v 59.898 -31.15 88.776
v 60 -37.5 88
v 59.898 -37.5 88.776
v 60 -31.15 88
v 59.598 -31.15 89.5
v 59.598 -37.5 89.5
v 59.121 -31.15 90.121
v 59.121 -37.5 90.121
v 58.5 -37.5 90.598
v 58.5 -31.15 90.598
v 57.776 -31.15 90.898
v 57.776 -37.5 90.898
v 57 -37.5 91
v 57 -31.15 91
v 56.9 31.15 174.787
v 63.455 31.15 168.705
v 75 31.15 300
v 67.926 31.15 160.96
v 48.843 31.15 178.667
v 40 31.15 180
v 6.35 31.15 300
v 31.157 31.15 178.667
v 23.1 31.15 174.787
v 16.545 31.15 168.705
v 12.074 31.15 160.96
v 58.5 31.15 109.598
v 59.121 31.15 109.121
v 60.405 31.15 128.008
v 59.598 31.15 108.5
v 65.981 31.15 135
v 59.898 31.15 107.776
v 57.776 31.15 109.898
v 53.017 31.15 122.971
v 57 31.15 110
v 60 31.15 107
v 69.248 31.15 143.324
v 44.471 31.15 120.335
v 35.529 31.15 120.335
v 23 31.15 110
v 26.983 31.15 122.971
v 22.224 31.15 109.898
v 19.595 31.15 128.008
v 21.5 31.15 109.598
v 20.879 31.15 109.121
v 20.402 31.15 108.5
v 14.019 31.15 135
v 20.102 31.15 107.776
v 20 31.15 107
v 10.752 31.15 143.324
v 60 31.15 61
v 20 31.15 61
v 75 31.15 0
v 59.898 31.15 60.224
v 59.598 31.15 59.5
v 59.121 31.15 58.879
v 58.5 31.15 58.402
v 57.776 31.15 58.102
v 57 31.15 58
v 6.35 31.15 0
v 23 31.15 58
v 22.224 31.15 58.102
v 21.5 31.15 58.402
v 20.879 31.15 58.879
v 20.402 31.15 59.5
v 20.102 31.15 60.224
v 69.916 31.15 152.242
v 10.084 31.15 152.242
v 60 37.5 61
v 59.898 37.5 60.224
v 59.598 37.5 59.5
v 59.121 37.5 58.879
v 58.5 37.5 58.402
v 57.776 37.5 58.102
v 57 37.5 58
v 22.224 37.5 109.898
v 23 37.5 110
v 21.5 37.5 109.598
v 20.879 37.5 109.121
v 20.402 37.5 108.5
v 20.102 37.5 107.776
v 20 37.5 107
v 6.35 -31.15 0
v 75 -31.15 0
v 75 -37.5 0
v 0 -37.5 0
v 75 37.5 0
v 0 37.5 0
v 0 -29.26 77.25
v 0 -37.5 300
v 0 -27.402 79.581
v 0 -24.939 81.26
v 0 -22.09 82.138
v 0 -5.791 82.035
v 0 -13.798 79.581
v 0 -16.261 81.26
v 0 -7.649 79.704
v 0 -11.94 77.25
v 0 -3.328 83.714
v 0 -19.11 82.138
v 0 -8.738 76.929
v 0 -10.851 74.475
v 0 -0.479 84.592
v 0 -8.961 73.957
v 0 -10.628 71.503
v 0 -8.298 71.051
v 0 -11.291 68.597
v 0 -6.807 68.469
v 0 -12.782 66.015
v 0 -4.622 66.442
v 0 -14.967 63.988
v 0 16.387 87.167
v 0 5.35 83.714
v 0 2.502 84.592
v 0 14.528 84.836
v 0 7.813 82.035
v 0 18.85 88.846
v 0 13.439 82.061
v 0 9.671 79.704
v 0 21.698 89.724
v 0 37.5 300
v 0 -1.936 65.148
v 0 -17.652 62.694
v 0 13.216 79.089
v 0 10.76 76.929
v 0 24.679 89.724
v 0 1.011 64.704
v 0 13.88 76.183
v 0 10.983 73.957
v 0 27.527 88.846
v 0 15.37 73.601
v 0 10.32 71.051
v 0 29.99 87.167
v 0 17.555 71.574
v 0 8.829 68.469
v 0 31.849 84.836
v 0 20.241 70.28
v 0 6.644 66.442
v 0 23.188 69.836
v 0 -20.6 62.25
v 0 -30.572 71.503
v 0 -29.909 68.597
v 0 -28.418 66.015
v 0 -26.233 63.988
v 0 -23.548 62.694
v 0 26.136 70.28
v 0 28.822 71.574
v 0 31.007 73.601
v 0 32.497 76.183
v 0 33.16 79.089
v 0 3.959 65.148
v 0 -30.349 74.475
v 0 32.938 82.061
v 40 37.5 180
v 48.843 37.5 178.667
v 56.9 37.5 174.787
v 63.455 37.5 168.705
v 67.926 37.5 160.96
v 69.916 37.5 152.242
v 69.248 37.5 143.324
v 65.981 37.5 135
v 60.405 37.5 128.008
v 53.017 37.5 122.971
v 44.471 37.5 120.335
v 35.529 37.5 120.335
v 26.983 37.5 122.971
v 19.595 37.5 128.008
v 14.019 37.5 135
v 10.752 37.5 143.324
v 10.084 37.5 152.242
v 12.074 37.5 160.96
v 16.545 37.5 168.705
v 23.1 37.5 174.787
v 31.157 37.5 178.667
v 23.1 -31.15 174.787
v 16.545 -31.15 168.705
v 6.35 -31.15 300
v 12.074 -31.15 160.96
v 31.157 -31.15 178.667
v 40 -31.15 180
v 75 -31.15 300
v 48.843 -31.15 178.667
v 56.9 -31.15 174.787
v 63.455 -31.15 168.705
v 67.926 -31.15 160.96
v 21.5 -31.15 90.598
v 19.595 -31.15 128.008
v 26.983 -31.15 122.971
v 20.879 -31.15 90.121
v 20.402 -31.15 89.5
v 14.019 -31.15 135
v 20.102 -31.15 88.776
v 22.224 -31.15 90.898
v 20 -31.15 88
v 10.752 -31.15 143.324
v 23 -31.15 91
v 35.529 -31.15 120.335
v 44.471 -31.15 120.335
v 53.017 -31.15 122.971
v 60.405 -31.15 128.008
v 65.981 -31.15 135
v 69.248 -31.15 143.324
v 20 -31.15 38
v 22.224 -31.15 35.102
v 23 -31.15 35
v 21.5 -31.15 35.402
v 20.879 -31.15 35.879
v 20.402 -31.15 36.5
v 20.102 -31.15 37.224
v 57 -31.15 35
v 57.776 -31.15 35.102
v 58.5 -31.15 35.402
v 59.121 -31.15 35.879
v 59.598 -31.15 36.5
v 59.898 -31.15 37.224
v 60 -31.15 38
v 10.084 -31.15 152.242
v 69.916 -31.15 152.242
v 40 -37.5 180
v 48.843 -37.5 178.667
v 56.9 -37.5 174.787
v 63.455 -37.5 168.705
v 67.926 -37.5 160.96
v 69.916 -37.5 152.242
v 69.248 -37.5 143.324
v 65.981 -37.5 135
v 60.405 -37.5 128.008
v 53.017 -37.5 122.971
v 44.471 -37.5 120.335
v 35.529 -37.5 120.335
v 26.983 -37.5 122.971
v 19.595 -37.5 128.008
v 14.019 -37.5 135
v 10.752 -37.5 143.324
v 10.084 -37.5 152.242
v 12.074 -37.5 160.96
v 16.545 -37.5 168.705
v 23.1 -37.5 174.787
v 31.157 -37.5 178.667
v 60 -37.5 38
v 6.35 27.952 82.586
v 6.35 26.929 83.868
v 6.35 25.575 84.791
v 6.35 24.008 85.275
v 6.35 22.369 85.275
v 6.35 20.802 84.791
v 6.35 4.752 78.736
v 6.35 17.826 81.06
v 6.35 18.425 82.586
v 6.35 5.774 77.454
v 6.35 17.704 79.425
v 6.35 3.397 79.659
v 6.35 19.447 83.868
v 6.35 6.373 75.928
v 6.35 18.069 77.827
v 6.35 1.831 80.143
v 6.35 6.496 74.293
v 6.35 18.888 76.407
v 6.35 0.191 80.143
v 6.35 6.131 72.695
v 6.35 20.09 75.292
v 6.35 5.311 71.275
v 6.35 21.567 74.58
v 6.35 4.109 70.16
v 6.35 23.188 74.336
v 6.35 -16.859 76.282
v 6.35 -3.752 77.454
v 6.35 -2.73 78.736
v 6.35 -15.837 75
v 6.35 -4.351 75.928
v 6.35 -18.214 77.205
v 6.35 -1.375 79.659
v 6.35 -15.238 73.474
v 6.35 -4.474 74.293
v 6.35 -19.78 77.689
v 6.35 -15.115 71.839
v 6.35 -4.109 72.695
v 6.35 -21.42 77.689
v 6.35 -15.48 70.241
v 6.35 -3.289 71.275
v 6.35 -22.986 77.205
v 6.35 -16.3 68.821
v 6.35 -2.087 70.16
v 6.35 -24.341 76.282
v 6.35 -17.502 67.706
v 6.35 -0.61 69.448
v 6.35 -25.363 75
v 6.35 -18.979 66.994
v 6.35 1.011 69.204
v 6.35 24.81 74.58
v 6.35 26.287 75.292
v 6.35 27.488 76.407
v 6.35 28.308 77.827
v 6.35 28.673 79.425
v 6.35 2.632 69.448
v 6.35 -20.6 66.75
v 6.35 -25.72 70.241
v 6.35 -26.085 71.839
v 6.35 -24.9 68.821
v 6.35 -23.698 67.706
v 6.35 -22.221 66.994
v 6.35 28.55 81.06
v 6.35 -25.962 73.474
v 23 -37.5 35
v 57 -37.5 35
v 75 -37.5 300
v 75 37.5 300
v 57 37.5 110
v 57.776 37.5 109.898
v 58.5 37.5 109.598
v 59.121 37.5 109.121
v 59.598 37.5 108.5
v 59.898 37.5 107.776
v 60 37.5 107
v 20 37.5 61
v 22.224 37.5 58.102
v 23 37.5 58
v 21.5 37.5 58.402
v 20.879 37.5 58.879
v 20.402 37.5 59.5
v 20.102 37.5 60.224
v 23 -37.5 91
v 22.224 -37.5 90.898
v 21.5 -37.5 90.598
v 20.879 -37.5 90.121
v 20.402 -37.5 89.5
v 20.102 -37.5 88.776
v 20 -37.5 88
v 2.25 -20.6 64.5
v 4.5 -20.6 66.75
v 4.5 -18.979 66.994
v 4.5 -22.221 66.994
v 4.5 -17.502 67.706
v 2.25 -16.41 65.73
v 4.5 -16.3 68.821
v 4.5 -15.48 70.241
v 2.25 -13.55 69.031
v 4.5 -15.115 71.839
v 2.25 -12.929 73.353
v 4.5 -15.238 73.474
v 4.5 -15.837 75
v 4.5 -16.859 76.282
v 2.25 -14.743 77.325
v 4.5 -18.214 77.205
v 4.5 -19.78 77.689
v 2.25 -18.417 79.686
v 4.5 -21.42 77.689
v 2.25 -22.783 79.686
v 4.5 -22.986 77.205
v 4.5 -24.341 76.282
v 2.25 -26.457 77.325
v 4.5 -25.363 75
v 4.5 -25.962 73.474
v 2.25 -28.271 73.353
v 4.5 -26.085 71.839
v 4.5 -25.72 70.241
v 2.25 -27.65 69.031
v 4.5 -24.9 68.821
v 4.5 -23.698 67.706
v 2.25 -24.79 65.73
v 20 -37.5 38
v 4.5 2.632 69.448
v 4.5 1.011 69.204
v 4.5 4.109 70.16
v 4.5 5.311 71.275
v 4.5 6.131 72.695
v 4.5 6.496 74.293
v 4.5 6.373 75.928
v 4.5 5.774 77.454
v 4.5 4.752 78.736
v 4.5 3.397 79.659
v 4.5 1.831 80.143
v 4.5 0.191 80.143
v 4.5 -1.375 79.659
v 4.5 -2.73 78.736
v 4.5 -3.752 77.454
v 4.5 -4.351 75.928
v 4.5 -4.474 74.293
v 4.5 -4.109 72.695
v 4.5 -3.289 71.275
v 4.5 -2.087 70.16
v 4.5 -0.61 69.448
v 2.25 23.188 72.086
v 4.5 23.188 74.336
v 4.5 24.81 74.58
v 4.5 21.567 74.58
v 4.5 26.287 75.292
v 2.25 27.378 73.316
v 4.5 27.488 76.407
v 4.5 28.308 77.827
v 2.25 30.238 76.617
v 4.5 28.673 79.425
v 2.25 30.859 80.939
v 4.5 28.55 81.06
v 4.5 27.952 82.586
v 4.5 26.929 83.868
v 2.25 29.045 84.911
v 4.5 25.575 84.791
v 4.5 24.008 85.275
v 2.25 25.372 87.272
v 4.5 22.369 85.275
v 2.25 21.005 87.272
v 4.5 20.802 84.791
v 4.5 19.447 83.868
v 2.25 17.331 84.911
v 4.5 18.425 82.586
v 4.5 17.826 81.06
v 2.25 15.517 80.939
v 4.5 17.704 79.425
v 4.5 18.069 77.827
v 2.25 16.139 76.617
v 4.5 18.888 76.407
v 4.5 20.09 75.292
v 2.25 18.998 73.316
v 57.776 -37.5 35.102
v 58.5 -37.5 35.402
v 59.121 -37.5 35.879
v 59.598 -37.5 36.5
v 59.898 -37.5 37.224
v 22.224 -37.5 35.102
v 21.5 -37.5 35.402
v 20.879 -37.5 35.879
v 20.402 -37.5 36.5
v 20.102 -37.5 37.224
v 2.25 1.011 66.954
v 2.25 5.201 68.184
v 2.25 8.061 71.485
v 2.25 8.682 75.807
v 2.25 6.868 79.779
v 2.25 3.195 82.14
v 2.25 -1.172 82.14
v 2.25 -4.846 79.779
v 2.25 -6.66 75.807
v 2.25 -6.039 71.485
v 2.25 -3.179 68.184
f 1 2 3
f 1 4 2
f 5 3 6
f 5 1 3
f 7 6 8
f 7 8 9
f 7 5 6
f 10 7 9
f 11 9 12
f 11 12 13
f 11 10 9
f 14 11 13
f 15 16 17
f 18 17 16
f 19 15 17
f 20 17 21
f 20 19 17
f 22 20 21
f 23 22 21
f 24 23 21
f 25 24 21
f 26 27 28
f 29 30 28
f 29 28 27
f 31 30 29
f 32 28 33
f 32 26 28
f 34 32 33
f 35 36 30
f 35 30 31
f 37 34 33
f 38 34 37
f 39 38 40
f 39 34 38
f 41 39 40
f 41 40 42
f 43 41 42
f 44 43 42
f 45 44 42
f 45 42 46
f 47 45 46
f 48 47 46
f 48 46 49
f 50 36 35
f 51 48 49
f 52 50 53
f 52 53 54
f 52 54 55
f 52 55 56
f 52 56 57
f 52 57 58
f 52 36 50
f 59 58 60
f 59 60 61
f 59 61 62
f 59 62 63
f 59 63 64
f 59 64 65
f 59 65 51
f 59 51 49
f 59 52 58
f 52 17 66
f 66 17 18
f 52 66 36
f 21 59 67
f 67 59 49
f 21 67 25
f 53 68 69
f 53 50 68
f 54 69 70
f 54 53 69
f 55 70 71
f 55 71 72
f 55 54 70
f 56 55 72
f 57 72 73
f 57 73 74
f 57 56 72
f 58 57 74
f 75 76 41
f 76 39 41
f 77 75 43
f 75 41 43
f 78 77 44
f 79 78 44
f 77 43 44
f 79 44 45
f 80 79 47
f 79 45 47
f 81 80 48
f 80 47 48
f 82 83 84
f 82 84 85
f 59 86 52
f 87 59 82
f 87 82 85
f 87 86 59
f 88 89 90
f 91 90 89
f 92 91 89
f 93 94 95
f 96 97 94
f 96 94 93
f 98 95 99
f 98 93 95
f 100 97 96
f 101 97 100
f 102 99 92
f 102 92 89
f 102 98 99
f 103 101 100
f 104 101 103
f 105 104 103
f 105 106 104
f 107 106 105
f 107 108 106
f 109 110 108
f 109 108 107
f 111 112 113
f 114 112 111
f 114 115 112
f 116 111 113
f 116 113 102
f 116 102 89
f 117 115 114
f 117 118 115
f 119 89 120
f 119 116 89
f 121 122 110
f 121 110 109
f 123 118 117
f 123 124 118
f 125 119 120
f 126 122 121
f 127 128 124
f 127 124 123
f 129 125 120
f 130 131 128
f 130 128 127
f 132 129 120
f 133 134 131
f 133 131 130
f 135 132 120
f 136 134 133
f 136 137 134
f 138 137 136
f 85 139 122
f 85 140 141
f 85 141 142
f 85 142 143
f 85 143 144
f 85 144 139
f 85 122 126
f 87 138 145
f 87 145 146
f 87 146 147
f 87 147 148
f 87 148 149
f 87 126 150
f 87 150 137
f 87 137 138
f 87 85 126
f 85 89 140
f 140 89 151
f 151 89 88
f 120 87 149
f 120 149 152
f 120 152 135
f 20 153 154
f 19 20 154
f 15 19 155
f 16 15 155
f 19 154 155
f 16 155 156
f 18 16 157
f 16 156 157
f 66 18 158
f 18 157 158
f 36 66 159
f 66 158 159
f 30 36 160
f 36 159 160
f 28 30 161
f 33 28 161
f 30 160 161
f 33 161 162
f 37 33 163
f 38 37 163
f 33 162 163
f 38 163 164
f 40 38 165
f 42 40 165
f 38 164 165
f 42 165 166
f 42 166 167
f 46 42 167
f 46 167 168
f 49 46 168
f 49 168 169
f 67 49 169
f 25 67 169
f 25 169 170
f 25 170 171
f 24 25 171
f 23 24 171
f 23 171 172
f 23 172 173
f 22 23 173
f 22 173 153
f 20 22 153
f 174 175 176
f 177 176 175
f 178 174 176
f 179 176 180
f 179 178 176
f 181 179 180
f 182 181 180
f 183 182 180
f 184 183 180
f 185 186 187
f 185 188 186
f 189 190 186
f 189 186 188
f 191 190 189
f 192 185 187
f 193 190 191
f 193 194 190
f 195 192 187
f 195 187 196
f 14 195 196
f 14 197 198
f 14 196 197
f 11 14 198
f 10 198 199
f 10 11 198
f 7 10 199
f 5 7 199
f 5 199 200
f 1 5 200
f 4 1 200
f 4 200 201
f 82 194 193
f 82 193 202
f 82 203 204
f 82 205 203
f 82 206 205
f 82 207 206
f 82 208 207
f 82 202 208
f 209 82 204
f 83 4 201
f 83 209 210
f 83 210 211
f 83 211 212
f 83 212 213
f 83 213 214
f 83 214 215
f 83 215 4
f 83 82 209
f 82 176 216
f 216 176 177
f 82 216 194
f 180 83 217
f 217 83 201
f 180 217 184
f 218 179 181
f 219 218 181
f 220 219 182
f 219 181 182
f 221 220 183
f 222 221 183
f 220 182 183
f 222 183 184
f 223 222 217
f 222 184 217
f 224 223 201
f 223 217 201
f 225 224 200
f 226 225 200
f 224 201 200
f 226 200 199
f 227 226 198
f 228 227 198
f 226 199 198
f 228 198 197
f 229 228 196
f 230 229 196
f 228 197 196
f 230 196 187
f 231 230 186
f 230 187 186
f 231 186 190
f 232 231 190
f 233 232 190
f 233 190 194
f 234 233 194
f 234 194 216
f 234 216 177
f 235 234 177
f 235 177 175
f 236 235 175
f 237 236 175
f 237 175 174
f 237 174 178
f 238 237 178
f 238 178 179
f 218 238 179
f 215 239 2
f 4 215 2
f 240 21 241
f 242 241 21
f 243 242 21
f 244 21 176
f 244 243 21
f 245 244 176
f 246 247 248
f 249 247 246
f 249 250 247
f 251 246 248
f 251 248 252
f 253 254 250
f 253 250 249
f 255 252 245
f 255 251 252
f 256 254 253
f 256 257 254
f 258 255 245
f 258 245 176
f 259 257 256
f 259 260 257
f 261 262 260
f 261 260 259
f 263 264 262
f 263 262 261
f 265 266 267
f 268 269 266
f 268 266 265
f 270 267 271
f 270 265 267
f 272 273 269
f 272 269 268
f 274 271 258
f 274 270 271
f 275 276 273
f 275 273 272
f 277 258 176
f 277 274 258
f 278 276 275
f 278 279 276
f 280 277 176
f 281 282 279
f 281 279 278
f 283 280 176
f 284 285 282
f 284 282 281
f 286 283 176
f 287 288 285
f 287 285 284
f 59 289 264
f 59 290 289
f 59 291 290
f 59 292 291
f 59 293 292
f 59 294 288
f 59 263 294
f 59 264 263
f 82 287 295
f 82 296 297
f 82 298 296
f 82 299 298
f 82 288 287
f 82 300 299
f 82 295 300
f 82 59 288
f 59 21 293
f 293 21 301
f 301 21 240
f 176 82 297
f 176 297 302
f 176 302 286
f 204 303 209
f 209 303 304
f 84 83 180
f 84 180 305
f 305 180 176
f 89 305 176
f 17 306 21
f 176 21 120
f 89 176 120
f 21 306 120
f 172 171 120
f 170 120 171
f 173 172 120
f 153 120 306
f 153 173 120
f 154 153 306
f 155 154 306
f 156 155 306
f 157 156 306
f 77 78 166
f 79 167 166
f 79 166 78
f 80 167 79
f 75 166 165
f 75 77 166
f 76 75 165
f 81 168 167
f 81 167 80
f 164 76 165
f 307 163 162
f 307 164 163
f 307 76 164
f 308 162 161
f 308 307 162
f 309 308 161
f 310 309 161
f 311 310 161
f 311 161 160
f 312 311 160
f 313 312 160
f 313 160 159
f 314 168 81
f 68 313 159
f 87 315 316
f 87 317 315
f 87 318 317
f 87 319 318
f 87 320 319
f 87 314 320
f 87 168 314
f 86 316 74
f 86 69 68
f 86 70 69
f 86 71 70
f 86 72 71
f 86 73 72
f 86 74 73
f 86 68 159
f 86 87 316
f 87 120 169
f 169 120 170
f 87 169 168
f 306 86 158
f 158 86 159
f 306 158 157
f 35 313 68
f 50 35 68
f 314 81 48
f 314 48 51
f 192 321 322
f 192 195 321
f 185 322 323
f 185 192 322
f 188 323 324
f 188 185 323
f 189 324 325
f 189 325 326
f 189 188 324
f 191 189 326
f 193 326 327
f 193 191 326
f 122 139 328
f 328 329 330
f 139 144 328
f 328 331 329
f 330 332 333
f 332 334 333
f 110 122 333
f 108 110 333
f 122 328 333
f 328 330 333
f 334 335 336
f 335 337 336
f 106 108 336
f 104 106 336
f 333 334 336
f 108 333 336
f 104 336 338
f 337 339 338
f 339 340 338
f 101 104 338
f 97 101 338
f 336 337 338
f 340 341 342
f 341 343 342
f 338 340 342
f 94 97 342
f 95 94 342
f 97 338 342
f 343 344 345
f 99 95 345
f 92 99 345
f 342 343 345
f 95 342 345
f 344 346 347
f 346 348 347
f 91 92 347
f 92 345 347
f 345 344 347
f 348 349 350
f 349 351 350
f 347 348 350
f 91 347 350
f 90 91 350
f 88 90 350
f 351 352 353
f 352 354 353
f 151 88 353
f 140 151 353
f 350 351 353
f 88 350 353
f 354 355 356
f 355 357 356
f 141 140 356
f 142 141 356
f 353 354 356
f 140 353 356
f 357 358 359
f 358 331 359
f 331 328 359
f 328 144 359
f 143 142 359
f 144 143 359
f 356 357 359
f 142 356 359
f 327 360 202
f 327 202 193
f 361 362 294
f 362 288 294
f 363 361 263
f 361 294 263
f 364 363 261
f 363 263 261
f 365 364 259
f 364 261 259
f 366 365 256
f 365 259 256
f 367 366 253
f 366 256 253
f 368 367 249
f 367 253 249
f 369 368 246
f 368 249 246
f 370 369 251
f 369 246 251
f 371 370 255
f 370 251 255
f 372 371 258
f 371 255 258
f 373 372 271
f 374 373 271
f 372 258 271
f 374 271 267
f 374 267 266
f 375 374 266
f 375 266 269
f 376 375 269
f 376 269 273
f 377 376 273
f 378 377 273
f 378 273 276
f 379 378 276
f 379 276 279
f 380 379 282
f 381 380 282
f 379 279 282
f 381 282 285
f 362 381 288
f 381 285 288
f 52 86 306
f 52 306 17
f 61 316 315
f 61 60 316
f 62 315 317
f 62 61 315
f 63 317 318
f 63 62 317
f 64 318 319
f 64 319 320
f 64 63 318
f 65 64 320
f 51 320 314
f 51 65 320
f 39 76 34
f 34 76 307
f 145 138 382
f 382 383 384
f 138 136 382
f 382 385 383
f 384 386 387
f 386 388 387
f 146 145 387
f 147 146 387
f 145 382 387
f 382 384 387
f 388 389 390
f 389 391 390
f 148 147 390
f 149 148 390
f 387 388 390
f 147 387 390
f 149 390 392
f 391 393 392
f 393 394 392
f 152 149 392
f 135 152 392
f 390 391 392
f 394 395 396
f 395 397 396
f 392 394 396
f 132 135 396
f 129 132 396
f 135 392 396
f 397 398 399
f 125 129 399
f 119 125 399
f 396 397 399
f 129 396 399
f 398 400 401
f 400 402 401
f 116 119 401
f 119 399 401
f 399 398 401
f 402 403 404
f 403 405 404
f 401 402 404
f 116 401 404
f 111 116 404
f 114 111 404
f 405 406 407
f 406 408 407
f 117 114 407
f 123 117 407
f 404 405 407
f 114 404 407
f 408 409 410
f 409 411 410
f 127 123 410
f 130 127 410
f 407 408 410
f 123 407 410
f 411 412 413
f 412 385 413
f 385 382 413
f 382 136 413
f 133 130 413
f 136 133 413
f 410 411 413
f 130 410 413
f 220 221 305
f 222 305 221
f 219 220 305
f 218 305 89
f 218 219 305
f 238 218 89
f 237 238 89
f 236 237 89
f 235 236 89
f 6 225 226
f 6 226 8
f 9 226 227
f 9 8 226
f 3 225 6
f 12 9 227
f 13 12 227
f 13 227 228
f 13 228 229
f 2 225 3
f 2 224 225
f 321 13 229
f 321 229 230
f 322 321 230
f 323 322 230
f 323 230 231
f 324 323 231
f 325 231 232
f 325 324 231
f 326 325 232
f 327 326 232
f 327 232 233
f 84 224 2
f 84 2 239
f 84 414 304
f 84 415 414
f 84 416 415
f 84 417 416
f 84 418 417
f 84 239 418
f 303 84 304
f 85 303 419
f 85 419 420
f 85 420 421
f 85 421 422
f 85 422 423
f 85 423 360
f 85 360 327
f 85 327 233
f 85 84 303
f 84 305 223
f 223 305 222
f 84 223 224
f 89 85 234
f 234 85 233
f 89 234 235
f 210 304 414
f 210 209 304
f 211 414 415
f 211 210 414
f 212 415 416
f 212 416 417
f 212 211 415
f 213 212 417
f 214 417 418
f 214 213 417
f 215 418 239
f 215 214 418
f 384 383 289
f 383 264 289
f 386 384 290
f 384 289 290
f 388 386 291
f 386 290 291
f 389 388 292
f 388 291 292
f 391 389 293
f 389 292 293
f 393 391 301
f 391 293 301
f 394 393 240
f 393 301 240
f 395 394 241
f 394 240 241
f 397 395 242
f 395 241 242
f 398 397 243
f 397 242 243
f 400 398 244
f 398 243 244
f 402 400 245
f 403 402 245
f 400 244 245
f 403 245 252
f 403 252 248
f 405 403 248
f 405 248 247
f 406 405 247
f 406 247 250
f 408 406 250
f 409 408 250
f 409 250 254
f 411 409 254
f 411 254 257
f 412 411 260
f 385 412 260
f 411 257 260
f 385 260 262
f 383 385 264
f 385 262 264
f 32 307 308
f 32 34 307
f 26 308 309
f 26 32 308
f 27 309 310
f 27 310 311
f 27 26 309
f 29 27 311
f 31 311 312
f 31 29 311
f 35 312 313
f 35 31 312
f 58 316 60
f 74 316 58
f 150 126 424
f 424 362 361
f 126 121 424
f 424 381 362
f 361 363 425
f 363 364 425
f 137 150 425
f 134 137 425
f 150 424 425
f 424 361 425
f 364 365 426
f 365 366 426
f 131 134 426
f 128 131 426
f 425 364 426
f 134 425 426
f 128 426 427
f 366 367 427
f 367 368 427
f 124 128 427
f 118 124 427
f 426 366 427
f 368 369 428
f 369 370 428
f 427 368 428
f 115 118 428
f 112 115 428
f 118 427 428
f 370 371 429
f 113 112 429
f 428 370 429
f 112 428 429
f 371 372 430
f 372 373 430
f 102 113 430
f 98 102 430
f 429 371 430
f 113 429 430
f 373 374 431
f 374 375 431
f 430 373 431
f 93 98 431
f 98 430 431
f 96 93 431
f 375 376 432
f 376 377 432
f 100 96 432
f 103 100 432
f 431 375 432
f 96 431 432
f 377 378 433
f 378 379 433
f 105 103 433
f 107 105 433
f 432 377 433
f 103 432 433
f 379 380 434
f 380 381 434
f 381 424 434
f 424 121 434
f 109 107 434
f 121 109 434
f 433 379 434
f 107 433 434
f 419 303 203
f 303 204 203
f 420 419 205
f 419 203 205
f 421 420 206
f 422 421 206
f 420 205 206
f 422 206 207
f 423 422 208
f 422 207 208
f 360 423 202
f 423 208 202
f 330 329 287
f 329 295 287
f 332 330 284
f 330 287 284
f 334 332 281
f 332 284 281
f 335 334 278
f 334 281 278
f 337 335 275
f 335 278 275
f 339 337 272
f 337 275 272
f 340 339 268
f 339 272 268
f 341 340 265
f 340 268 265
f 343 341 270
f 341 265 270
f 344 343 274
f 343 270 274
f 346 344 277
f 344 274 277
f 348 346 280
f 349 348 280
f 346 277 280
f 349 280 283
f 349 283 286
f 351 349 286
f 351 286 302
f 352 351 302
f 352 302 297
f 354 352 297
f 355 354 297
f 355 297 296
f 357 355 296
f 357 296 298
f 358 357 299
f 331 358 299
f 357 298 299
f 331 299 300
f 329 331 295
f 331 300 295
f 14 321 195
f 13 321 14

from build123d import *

# Parameters (mm, degrees)
BOSS_EXTRUDE1_DEPTH                                  = 300
SKETCH2_R                                            = 30
CUT_EXTRUDE1_DEPTH                                   = 319.198051534
SKETCH3_W                                            = 40
SKETCH3_H                                            = 56
CUT_EXTRUDE2_DEPTH                                   = 10
SKETCH4_W                                            = 40
SKETCH4_H                                            = 52
CUT_EXTRUDE3_DEPTH                                   = 10
FILLET1_R                                            = 3
CSK_FOR_M10_COUNTERSUNK_FLAT_HEAD_SCREW1_D           = 11
CSK_FOR_M10_COUNTERSUNK_FLAT_HEAD_SCREW1_DEPTH       = 20.003
CSK_FOR_M10_COUNTERSUNK_FLAT_HEAD_SCREW1_CSINK_D     = 20
CSK_FOR_M10_COUNTERSUNK_FLAT_HEAD_SCREW1_CSINK_ANGLE = 90
CSK_FOR_M10_COUNTERSUNK_FLAT_HEAD_SCREW1_TIP         = 3.304733405


with BuildPart() as part:
    # Sketch1 → Boss-Extrude1 (new body)
    with BuildSketch(Plane.XY):
        Polygon((0, -37.5), (0, 37.5), (75, 37.5), (75, 31.15), (6.35, 31.15), (6.35, -31.15), (75, -31.15), (75, -37.5), align=None)
    extrude(amount=BOSS_EXTRUDE1_DEPTH)

    # Sketch2 → Cut-Extrude1 (cut, through all)
    with BuildSketch(Plane(origin=(0, 37.5, 0), x_dir=(1, 0, 0), z_dir=(0, 1, 0))):
        with Locations(Location((40, -150, 0), (0, 0, 270))):
            Circle(SKETCH2_R)
    extrude(amount=-CUT_EXTRUDE1_DEPTH, mode=Mode.SUBTRACT)

    # Sketch3 → Cut-Extrude2 (cut)
    with BuildSketch(Plane.XZ.offset(37.5)):
        with Locations((40, 63)):
            Rectangle(SKETCH3_W, SKETCH3_H)
    extrude(amount=-CUT_EXTRUDE2_DEPTH, mode=Mode.SUBTRACT)

    # Sketch4 → Cut-Extrude3 (cut)
    with BuildSketch(Plane(origin=(0, 37.5, 0), x_dir=(1, 0, 0), z_dir=(0, 1, 0))):
        with Locations((40, -84)):
            Rectangle(SKETCH4_W, SKETCH4_H)
    extrude(amount=-CUT_EXTRUDE3_DEPTH, mode=Mode.SUBTRACT)

    # Fillet1
    fillet1_edges = [part.edges().sort_by_distance(p)[0] for p in [
        (20, -34.325, 91),
        (60, -34.325, 91),
        (60, -34.325, 35),
        (20, -34.325, 35),
        (60, 34.325, 110),
        (20, 34.325, 110),
        (20, 34.325, 58),
        (60, 34.325, 58),
    ]]
    fillet(fillet1_edges, radius=FILLET1_R)

    # CSK for M10 Countersunk Flat Head Screw1
    with Locations(Plane.ZY):
        with Locations((74.704121605, 1.01110333), (72.25, -20.6), (79.836004025, 23.188381743)):
            CounterSinkHole(CSK_FOR_M10_COUNTERSUNK_FLAT_HEAD_SCREW1_D / 2, CSK_FOR_M10_COUNTERSUNK_FLAT_HEAD_SCREW1_CSINK_D / 2, depth=CSK_FOR_M10_COUNTERSUNK_FLAT_HEAD_SCREW1_DEPTH, counter_sink_angle=CSK_FOR_M10_COUNTERSUNK_FLAT_HEAD_SCREW1_CSINK_ANGLE)
            with Locations((0, 0, -(CSK_FOR_M10_COUNTERSUNK_FLAT_HEAD_SCREW1_DEPTH + CSK_FOR_M10_COUNTERSUNK_FLAT_HEAD_SCREW1_TIP / 2))):  # 118° drill point
                Cone(0, CSK_FOR_M10_COUNTERSUNK_FLAT_HEAD_SCREW1_D / 2, CSK_FOR_M10_COUNTERSUNK_FLAT_HEAD_SCREW1_TIP, mode=Mode.SUBTRACT)


solid = part.part
